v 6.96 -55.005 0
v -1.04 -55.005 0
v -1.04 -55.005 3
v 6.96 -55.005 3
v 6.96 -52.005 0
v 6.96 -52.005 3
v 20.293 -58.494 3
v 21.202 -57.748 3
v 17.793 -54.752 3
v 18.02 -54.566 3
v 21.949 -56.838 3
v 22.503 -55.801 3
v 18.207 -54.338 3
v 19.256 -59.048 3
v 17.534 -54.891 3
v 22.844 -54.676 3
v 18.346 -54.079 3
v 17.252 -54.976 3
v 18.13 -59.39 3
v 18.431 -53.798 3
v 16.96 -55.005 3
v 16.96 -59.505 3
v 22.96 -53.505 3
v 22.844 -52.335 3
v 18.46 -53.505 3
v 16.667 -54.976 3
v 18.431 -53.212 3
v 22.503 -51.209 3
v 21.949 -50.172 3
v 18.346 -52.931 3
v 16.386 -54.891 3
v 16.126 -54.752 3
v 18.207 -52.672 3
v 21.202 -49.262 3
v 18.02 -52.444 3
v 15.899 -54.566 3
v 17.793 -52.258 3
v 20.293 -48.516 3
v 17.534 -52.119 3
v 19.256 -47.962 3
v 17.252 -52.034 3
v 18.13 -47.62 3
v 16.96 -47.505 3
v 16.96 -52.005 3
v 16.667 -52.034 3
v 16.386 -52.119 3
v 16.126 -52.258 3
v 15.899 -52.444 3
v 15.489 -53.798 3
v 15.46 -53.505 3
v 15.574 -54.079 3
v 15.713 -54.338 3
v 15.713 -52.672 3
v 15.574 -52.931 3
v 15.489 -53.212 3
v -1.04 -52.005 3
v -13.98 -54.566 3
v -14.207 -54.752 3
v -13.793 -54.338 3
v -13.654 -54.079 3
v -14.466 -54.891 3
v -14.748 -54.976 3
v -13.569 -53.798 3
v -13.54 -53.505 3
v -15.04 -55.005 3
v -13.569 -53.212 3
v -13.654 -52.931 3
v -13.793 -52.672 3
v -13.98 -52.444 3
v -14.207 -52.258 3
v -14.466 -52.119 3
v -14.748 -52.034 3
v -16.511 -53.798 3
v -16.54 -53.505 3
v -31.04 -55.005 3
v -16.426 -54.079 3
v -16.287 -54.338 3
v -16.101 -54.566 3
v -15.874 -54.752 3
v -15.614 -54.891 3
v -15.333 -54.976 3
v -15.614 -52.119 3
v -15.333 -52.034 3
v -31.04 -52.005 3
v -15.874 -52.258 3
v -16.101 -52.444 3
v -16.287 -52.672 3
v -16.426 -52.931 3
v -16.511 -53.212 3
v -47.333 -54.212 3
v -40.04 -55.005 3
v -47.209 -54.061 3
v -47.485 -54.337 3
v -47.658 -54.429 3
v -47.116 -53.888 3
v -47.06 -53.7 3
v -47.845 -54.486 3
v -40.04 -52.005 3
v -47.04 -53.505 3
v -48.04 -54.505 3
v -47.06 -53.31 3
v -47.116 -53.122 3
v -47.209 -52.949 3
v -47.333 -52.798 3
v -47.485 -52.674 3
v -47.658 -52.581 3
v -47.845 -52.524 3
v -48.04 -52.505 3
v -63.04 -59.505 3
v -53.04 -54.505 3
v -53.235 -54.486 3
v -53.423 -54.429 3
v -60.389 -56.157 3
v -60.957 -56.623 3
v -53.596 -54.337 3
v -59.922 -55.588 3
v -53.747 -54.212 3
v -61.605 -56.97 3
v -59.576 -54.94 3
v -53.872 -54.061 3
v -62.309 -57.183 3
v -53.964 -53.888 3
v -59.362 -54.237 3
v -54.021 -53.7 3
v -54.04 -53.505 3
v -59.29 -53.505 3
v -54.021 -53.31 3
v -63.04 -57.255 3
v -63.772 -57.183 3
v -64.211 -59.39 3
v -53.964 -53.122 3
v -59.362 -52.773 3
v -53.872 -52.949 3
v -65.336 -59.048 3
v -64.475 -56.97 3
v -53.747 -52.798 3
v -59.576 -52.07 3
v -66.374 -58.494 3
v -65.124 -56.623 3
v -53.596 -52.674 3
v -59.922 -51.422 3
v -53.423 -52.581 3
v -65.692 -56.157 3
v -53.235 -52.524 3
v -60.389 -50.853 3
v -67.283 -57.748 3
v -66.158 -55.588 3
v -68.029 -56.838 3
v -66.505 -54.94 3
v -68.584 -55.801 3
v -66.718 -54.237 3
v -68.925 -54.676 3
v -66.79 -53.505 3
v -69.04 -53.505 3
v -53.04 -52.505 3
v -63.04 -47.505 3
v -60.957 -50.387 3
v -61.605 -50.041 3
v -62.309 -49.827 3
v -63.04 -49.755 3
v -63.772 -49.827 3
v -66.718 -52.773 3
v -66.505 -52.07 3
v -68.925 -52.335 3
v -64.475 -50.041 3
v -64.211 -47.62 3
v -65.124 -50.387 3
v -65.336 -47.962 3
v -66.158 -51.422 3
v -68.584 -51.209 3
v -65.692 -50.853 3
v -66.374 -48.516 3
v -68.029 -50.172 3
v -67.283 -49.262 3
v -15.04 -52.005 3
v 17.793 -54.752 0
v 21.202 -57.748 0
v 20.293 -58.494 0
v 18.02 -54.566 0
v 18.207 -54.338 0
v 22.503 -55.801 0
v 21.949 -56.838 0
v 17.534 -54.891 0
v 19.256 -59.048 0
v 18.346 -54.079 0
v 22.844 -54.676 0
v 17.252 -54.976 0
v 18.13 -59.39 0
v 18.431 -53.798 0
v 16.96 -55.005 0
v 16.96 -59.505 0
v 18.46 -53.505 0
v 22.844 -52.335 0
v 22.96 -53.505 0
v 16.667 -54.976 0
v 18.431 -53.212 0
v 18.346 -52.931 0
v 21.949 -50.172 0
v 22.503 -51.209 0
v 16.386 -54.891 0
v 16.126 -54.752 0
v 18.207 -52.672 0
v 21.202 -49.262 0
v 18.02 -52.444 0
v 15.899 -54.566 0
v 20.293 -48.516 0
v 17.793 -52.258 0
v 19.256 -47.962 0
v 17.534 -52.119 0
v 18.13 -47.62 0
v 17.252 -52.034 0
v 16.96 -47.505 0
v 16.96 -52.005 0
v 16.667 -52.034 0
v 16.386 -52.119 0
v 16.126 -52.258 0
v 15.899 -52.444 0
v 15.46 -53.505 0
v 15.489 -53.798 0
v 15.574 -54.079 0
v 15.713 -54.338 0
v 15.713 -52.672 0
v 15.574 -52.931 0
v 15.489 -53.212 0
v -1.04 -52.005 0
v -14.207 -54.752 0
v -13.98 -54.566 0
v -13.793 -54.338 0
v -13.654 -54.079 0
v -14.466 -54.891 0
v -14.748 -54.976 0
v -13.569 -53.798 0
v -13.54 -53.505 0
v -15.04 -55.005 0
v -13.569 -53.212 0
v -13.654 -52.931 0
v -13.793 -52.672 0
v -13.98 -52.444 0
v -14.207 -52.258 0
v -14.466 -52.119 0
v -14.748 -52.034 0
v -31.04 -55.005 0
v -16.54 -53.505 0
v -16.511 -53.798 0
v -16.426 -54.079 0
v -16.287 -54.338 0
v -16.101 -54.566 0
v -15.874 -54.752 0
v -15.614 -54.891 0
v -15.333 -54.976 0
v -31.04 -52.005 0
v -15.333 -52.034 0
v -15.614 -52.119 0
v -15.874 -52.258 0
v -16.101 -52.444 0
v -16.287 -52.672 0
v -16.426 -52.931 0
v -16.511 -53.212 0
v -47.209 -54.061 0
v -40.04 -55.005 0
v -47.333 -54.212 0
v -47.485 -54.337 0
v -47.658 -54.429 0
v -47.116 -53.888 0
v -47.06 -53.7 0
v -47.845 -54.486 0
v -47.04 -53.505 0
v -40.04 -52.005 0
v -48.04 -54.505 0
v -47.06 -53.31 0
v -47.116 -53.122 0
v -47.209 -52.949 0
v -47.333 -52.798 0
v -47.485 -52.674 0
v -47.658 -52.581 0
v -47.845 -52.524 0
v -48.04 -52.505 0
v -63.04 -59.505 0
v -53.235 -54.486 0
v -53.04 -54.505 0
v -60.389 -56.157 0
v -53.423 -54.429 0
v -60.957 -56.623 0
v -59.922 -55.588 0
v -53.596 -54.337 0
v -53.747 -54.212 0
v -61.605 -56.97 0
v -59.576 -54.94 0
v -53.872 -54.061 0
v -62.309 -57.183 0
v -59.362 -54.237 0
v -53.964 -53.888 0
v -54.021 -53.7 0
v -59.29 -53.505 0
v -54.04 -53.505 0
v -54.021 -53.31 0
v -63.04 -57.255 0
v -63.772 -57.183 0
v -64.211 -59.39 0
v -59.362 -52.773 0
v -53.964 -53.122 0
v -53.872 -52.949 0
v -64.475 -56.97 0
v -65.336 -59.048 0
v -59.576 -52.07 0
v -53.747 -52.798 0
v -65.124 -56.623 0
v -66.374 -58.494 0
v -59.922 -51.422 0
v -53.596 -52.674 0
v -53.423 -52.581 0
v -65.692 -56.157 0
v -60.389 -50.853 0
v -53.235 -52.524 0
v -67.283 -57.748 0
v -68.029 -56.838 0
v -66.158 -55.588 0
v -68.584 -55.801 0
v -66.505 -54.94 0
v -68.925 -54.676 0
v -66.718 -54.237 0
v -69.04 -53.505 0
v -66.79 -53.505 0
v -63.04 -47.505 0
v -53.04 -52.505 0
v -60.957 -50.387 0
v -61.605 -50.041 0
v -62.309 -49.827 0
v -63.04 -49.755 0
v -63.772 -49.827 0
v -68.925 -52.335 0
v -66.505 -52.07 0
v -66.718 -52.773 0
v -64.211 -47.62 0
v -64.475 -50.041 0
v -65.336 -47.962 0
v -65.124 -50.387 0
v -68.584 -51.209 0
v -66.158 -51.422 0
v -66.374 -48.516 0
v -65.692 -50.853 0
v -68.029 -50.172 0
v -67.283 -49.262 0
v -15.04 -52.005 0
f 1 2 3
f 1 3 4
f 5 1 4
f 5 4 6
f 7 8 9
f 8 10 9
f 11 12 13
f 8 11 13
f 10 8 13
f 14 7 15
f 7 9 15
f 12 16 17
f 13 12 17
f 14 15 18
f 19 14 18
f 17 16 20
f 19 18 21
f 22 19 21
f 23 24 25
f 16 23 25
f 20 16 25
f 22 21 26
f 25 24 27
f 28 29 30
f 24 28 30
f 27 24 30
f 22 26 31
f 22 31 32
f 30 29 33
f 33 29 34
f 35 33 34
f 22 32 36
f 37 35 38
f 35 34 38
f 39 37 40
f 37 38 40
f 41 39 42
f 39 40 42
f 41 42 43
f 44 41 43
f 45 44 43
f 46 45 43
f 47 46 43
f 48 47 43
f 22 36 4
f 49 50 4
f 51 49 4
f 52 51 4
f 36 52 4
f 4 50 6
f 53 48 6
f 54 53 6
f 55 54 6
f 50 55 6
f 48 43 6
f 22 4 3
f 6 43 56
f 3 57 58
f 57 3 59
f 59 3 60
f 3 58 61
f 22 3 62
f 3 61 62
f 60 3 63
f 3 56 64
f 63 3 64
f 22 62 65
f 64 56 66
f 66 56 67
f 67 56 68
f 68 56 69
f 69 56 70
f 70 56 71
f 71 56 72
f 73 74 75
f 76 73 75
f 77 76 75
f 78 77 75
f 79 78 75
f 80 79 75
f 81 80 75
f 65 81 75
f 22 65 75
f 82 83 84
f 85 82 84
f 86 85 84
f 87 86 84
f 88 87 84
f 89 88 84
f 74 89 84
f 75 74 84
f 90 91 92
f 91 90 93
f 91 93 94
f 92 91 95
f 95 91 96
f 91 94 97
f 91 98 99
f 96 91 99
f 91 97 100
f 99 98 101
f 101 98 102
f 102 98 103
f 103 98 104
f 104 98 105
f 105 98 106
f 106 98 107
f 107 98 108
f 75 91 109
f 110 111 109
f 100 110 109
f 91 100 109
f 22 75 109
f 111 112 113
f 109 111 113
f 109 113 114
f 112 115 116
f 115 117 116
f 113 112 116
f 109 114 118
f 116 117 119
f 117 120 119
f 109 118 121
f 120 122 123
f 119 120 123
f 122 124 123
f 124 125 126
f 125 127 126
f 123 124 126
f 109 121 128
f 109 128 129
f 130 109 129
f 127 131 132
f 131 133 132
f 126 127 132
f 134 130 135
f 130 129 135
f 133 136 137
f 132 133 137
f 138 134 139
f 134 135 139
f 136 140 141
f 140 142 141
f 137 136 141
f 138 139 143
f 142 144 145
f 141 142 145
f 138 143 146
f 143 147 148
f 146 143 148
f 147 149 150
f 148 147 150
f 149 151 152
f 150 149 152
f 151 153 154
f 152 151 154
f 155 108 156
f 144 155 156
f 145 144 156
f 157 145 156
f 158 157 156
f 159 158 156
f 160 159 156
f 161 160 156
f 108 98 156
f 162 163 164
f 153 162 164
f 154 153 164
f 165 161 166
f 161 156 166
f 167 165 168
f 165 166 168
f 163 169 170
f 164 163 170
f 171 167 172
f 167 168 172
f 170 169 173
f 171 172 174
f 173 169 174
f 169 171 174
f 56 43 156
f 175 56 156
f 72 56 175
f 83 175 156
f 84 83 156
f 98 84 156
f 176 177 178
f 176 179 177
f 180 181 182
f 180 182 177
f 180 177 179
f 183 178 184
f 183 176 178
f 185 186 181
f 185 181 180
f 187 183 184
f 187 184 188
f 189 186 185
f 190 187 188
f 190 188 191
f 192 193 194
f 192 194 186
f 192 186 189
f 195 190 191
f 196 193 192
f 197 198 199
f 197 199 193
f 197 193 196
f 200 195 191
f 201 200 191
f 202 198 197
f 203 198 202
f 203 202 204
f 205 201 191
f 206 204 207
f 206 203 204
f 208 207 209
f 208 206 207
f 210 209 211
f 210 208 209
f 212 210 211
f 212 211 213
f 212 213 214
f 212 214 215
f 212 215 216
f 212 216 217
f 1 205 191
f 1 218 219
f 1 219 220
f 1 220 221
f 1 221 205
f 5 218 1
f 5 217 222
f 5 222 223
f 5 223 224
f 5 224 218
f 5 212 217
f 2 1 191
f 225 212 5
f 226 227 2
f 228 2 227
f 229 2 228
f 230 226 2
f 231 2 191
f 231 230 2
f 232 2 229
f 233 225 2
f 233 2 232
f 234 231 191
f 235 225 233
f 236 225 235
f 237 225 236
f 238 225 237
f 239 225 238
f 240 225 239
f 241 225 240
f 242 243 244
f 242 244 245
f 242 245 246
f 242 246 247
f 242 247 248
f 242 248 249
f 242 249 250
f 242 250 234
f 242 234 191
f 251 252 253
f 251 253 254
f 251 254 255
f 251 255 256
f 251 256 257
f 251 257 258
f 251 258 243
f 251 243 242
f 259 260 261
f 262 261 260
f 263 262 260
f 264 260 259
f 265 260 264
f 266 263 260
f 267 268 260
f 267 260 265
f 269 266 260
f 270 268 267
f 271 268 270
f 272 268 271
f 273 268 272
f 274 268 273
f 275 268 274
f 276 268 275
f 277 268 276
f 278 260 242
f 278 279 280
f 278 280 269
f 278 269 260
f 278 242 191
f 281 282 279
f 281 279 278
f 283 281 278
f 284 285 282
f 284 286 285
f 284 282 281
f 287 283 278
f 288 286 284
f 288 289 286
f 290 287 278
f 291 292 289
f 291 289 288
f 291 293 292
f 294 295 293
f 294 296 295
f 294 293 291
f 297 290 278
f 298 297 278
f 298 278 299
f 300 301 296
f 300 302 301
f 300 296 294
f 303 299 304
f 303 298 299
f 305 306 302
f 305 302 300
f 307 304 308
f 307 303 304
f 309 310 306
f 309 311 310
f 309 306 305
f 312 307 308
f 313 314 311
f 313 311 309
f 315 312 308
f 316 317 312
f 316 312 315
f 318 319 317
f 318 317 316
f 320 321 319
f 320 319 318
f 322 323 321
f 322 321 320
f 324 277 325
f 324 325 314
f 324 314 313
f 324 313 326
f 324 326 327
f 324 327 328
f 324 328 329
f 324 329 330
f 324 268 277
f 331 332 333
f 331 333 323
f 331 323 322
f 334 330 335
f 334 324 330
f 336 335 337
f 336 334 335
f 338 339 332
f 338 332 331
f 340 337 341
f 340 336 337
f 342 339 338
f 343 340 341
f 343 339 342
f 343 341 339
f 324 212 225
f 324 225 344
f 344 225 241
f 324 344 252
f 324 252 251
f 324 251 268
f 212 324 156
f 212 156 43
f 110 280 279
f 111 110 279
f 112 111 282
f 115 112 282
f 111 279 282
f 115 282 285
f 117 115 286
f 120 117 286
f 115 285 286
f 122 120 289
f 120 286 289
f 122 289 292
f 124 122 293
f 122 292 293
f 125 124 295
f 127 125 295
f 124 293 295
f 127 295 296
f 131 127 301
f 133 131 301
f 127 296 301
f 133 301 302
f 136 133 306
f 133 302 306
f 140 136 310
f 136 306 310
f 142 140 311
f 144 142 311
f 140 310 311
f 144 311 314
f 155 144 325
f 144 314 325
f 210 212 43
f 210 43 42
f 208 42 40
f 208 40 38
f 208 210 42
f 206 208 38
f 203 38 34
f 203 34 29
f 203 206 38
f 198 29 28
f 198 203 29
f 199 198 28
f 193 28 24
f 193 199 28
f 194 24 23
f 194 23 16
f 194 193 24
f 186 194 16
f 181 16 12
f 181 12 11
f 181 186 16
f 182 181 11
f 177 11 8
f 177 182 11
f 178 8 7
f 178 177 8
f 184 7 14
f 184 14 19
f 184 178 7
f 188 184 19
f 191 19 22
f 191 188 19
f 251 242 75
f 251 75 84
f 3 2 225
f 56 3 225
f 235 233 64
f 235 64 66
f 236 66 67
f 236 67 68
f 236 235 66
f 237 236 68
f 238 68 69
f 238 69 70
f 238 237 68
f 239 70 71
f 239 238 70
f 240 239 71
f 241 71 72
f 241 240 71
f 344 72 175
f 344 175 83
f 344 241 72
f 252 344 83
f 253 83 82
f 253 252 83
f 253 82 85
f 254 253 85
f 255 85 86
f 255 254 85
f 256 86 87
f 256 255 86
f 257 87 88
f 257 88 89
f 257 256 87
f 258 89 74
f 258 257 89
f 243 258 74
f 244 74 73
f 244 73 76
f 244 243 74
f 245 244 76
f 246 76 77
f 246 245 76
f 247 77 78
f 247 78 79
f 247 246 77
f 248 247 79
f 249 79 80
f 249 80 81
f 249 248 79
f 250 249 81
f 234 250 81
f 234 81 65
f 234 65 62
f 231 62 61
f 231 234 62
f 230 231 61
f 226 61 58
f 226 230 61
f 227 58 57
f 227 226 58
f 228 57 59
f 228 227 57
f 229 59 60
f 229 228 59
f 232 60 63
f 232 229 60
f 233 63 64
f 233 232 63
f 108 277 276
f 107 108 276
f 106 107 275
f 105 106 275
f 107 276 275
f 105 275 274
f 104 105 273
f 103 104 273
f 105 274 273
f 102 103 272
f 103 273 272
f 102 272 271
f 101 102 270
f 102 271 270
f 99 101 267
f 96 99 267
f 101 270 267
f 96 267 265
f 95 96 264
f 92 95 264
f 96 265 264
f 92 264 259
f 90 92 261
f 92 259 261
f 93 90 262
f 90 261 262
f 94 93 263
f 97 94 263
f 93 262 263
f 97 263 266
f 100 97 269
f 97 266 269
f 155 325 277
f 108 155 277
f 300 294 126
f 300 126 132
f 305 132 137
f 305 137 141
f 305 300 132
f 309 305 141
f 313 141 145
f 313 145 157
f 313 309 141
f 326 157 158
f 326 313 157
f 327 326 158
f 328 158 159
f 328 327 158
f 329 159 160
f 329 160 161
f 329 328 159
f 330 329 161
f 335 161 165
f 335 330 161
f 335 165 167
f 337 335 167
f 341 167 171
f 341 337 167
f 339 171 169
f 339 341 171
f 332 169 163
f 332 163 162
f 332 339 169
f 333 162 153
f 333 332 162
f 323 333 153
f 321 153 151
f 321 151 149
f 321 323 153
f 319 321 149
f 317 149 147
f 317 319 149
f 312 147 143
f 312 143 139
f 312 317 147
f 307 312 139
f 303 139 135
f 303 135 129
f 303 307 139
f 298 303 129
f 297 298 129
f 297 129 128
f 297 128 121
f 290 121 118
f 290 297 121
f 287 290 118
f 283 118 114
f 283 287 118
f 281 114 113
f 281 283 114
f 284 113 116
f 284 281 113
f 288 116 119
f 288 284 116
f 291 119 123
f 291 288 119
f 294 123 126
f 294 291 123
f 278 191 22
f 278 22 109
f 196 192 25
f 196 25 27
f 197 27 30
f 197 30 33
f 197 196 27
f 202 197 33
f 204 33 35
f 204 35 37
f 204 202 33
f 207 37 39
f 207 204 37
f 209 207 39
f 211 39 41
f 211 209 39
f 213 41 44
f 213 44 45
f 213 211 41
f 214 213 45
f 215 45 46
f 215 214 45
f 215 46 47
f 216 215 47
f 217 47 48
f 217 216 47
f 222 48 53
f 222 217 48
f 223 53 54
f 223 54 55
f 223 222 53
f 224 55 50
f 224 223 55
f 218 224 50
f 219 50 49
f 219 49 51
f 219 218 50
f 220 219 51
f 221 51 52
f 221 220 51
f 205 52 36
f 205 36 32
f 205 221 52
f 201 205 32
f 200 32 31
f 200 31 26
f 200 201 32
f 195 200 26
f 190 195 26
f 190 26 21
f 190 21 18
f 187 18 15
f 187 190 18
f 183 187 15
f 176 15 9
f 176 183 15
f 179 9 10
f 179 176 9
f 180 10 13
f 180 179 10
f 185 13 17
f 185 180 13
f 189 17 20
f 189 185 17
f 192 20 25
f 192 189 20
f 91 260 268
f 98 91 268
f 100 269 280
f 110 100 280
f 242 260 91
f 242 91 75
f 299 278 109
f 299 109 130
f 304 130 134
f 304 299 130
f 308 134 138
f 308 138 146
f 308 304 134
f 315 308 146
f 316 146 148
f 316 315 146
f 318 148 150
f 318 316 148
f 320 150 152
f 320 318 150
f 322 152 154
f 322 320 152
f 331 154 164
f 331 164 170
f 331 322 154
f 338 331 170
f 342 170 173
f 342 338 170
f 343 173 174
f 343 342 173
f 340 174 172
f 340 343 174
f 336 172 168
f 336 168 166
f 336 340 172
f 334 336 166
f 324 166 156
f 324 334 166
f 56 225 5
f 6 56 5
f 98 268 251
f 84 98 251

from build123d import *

# Parameters (mm, degrees)
ESQUISSE9_R        = 1.5
ESQUISSE9_R_2      = 3.75
ESQUISSE9_W        = 9
ESQUISSE9_H        = 3
ESQUISSE9_W_2      = 8
BOSS_EXTRU_9_DEPTH = 3


with BuildPart() as part:
    # Esquisse9 → Boss.-Extru.9 (new body)
    with BuildSketch(Plane.XY):
        with BuildLine():
            Line((-63.040292512, -47.505063948), (16.959707488, -47.505063948))
            ThreePointArc((16.959707488, -47.505063948), (22.959707488, -53.505063948), (16.959707488, -59.505063948))
            Line((16.959707488, -59.505063948), (-63.040292512, -59.505063948))
            ThreePointArc((-63.040292512, -59.505063948), (-69.040292512, -53.505063948), (-63.040292512, -47.505063948))
        make_face()
        with Locations((-15.040292512, -53.505063948)):
            Circle(ESQUISSE9_R, mode=Mode.SUBTRACT)
        with Locations((16.959707488, -53.505063948)):
            Circle(ESQUISSE9_R, mode=Mode.SUBTRACT)
        with Locations((-63.040292512, -53.505063948)):
            Circle(ESQUISSE9_R_2, mode=Mode.SUBTRACT)
        with Locations((-35.540292512, -53.505063948)):
            Rectangle(ESQUISSE9_W, ESQUISSE9_H, mode=Mode.SUBTRACT)
        with Locations((2.959707488, -53.505063948)):
            Rectangle(ESQUISSE9_W_2, ESQUISSE9_H, mode=Mode.SUBTRACT)
        with BuildLine():
            Line((-53.040292512, -52.505063948), (-48.040292512, -52.505063948))
            ThreePointArc((-48.040292512, -52.505063948), (-47.040292512, -53.505063948), (-48.040292512, -54.505063948))
            Line((-48.040292512, -54.505063948), (-53.040292512, -54.505063948))
            ThreePointArc((-53.040292512, -54.505063948), (-54.040292512, -53.505063948), (-53.040292512, -52.505063948))
        make_face(mode=Mode.SUBTRACT)
    extrude(amount=BOSS_EXTRU_9_DEPTH)


solid = part.part
